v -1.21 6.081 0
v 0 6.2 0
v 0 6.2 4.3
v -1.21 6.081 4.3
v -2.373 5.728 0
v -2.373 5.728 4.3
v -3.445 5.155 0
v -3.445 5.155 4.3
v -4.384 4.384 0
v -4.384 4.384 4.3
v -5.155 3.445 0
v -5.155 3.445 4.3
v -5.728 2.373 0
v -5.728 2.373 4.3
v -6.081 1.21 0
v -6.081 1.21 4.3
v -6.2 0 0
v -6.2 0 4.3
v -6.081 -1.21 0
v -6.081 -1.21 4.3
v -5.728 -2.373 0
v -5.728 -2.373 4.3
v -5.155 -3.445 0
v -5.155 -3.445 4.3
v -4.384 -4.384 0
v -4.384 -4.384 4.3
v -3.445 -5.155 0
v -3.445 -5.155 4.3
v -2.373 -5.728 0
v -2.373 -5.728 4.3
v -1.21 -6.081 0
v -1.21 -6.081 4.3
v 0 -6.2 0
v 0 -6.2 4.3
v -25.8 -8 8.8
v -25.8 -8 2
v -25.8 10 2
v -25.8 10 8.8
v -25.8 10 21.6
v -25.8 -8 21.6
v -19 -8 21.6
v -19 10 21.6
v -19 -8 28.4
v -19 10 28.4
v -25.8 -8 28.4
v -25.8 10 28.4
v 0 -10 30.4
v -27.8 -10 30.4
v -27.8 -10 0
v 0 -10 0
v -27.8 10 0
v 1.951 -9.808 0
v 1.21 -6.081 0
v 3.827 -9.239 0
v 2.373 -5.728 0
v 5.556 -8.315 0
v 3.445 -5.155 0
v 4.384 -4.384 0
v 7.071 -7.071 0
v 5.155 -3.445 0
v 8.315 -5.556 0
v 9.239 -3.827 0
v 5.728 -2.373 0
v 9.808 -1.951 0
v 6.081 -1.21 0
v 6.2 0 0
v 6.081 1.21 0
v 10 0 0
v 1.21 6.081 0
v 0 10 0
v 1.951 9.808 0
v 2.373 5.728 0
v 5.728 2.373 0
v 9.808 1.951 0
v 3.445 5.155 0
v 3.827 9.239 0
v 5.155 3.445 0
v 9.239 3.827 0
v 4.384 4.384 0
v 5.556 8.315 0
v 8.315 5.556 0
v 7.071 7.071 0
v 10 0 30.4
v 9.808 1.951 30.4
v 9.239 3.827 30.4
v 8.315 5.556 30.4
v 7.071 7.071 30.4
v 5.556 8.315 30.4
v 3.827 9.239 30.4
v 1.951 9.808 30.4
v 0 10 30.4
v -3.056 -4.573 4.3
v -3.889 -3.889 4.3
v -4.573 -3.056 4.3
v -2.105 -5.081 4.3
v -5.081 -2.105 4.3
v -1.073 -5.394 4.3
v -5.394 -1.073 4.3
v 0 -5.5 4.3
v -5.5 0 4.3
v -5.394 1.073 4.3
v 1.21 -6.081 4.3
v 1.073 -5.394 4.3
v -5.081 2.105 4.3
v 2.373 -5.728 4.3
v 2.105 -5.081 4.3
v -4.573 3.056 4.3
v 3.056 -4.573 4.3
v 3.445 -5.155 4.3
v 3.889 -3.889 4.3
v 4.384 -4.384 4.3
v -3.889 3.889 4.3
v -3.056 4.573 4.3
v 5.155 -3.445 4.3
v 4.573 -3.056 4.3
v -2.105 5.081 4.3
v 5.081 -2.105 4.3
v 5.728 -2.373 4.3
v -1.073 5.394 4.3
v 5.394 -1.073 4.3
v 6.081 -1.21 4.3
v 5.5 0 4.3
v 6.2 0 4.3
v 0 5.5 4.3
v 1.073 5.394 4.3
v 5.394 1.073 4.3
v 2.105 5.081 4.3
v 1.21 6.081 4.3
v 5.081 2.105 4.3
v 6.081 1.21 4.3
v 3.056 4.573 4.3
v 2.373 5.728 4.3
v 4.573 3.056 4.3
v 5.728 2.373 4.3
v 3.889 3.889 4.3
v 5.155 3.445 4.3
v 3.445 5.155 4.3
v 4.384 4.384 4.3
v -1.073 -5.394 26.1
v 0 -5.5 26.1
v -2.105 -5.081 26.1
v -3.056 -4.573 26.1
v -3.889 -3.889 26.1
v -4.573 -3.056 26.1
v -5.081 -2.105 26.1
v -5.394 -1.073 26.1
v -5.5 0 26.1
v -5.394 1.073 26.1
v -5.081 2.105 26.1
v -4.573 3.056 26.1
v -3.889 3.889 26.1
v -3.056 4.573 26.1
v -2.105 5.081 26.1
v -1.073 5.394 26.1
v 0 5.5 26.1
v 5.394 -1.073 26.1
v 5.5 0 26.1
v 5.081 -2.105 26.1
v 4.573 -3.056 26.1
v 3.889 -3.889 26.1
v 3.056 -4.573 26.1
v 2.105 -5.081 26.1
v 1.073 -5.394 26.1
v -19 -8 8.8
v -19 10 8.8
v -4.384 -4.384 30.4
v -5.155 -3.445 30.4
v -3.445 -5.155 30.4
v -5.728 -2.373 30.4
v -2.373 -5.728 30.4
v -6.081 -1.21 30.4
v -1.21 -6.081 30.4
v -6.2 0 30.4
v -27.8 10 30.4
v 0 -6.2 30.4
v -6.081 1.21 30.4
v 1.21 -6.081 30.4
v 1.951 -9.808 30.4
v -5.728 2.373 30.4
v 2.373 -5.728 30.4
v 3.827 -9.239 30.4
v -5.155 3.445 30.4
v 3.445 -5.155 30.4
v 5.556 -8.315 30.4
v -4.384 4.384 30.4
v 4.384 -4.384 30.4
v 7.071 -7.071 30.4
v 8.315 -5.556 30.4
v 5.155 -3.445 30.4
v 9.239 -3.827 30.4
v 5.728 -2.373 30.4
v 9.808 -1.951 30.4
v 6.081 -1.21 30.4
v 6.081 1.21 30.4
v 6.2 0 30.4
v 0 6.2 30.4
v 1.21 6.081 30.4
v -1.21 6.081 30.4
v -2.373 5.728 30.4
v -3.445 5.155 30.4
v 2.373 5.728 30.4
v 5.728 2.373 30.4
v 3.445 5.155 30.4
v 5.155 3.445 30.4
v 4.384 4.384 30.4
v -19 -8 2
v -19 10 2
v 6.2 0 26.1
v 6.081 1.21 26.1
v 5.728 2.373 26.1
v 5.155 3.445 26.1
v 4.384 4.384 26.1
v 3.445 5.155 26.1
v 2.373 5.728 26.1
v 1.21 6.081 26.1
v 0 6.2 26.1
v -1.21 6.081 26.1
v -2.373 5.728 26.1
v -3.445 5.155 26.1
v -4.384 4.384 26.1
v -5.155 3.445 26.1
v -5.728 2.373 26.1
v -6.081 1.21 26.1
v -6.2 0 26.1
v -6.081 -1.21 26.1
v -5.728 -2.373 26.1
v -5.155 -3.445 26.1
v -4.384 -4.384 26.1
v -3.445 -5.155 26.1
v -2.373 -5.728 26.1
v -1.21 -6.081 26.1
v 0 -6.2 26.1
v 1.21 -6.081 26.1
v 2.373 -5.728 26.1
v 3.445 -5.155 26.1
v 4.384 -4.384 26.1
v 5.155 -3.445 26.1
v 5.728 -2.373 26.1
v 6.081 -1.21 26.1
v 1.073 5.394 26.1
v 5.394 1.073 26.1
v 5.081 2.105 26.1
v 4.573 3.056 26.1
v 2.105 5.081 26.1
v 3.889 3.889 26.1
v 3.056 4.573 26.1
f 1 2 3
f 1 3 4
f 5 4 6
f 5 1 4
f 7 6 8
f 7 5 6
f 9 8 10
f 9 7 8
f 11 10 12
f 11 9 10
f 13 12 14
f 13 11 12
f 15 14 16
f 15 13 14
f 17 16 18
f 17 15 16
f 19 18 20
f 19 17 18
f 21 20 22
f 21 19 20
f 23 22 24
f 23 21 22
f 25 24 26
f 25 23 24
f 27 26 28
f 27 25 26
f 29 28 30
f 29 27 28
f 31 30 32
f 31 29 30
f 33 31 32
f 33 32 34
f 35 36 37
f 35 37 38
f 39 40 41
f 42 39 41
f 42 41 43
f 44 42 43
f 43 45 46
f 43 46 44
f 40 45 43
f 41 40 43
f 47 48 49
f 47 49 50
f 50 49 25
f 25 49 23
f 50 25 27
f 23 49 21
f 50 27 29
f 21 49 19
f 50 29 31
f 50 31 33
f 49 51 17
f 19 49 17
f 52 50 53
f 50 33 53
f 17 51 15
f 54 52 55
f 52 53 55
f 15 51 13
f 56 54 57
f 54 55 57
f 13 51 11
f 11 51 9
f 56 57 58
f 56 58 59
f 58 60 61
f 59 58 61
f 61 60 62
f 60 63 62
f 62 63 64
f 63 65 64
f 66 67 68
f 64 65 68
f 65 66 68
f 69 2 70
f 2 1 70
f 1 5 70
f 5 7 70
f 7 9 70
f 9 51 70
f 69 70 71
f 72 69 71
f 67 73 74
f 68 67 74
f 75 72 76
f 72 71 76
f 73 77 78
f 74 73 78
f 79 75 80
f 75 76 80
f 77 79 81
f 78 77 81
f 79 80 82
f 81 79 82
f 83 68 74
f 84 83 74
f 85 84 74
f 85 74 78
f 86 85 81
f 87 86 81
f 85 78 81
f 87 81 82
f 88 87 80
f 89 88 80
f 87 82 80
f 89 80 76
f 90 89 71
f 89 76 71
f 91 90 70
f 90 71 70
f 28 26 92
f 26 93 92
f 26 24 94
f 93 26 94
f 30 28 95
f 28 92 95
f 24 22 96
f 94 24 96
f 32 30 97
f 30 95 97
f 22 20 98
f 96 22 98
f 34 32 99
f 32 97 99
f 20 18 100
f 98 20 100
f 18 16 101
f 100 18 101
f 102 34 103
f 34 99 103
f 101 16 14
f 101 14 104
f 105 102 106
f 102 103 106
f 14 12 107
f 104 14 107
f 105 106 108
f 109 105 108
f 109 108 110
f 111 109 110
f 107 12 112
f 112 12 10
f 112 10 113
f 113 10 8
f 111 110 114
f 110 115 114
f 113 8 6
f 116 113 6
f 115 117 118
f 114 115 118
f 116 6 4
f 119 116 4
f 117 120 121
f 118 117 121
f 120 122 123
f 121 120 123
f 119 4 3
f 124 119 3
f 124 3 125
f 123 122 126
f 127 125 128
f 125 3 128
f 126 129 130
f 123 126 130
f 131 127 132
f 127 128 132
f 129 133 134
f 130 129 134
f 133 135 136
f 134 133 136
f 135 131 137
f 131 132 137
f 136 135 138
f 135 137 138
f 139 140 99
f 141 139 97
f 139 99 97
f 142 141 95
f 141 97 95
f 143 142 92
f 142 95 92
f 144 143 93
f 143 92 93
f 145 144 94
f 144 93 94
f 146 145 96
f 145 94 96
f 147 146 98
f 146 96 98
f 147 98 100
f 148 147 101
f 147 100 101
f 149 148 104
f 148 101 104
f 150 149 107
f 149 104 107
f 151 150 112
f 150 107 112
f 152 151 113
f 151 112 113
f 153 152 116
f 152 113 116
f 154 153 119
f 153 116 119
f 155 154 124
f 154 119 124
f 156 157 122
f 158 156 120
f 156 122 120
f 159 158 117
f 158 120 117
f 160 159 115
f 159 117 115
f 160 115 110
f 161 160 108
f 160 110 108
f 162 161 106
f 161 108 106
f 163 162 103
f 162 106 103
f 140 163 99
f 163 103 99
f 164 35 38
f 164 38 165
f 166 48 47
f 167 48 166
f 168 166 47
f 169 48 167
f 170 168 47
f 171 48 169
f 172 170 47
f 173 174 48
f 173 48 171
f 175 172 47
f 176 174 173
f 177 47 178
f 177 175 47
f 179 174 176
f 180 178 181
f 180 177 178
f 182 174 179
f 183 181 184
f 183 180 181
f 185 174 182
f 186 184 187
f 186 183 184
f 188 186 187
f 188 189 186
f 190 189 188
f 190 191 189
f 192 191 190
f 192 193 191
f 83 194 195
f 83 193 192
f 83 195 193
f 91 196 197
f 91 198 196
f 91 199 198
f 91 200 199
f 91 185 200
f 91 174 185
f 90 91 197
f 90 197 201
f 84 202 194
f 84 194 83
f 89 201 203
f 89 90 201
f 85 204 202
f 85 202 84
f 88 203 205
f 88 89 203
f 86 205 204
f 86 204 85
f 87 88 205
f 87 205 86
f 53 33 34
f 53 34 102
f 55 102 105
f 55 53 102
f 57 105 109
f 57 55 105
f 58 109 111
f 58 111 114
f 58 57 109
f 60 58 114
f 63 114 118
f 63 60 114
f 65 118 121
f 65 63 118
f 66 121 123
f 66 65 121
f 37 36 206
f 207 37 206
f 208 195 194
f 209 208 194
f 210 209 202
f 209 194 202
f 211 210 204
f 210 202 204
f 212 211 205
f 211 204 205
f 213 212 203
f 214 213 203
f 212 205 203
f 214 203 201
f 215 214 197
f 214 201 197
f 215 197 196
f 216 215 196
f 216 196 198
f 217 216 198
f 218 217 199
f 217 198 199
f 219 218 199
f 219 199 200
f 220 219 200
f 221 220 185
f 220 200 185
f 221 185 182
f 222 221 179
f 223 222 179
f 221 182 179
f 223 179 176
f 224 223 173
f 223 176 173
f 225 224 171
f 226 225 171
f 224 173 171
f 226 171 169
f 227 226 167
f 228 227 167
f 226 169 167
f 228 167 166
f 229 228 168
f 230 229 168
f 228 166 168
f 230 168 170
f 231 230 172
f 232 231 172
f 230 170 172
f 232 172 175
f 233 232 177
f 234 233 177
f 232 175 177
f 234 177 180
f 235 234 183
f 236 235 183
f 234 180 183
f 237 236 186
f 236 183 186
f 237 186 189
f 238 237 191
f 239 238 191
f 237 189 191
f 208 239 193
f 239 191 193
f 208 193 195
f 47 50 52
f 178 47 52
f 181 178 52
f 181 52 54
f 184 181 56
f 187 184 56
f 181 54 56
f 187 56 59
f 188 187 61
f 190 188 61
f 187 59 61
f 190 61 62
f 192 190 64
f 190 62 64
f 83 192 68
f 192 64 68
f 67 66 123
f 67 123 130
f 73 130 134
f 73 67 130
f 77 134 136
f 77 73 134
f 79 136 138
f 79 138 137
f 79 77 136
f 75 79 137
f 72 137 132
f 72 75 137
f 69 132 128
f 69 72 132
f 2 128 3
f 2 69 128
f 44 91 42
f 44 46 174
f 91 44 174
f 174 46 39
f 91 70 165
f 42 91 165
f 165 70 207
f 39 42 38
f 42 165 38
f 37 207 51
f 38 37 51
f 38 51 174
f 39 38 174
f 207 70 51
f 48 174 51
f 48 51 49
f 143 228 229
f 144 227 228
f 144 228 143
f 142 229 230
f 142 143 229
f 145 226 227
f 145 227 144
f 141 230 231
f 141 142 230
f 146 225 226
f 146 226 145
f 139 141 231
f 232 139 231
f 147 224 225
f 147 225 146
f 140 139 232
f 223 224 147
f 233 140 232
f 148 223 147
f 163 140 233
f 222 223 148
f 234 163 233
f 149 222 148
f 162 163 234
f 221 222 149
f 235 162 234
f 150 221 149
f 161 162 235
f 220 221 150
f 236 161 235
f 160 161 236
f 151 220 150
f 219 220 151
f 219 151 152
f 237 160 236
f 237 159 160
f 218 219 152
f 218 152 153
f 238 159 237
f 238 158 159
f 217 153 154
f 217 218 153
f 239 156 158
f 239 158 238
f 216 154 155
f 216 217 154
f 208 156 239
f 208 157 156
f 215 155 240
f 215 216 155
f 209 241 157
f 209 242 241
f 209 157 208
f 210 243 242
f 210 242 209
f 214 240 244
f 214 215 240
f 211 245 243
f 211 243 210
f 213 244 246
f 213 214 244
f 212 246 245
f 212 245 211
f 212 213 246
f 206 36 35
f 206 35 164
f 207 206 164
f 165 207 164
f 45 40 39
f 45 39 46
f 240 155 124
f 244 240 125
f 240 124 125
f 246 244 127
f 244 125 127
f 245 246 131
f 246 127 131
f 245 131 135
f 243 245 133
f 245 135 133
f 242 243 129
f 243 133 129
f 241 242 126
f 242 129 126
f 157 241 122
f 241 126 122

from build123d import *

# Parameters (mm, degrees)
F1_DEPTH = 30.4
F2_W     = 6.8
F2_H     = 6.8
F3_DEPTH = 50
F4_R     = 6.2
F4_R_2   = 5.5
F5_DEPTH = 4.3
F6_DEPTH = 4.3
F7_DEPTH = 2


# Not quite as in the source:
# - a feature names something its author has since deleted; it is built from what else it names


with BuildPart() as f1:
    # F0 (on Top) → F1 (new body)
    with BuildSketch(Plane.XY):
        with BuildLine():
            ThreePointArc((0, -10), (-10, 0), (0, 10))
            Line((0, 10), (-27.8, 10))
            Line((-27.8, 10), (-27.8, -10))
            Line((-27.8, -10), (0, -10))
        make_face()
        with BuildLine():
            ThreePointArc((0, -10), (7.0710678119, -7.0710678119), (10, 0))
            ThreePointArc((10, 0), (7.0710678119, 7.0710678119), (0, 10))
            Line((0, 10), (0, 6.2))
            ThreePointArc((0, 6.2), (4.3840620434, 4.3840620434), (6.2, 0))
            ThreePointArc((6.2, 0), (4.3840620434, -4.3840620434), (0, -6.2))
            Line((0, -6.2), (0, -10))
        make_face()
        with BuildLine():
            Line((0, 6.2), (0, 10))
            ThreePointArc((0, 10), (-10, 0), (0, -10))
            Line((0, -10), (0, -6.2))
            ThreePointArc((0, -6.2), (-6.2, 0), (0, 6.2))
        make_face()
        with BuildLine():
            Line((0, 5.5), (0, 6.2))
            ThreePointArc((0, 6.2), (-6.2, 0), (0, -6.2))
            Line((0, -6.2), (0, -5.5))
            ThreePointArc((0, -5.5), (-5.5, 0), (0, 5.5))
        make_face()
        with BuildLine():
            ThreePointArc((6.2, 0), (4.3840620434, 4.3840620434), (0, 6.2))
            Line((0, 6.2), (0, 5.5))
            ThreePointArc((0, 5.5), (3.8890872965, 3.8890872965), (5.5, 0))
            ThreePointArc((5.5, 0), (3.8890872965, -3.8890872965), (0, -5.5))
            Line((0, -5.5), (0, -6.2))
            ThreePointArc((0, -6.2), (4.3840620434, -4.3840620434), (6.2, 0))
        make_face()
    extrude(amount=F1_DEPTH)

    # F2 (on face) → F3 (cut)
    with BuildSketch(Plane.XZ.offset(10)):
        with Locations((-22.4, 25)):
            Rectangle(F2_W, F2_H)
        with Locations((-22.4, 5.4)):
            Rectangle(F2_W, F2_H)
    extrude(amount=-F3_DEPTH, mode=Mode.SUBTRACT)

    # F4 (on face) → F5 (cut)
    with BuildSketch(Plane.XY.offset(30.4)):
        Circle(F4_R)
        Circle(F4_R_2, mode=Mode.SUBTRACT)
    extrude(amount=-F5_DEPTH, mode=Mode.SUBTRACT)

    # F0 (on Top) → F6 (cut)
    with BuildSketch(Plane.XY):
        with BuildLine():
            ThreePointArc((6.2, 0), (4.3840620434, 4.3840620434), (0, 6.2))
            Line((0, 6.2), (0, 5.5))
            ThreePointArc((0, 5.5), (3.8890872965, 3.8890872965), (5.5, 0))
            ThreePointArc((5.5, 0), (3.8890872965, -3.8890872965), (0, -5.5))
            Line((0, -5.5), (0, -6.2))
            ThreePointArc((0, -6.2), (4.3840620434, -4.3840620434), (6.2, 0))
        make_face()
        with BuildLine():
            Line((0, 5.5), (0, 6.2))
            ThreePointArc((0, 6.2), (-6.2, 0), (0, -6.2))
            Line((0, -6.2), (0, -5.5))
            ThreePointArc((0, -5.5), (-5.5, 0), (0, 5.5))
        make_face()
    extrude(amount=F6_DEPTH, mode=Mode.SUBTRACT)

    # F2 (on face) → F7 (join)
    with BuildSketch(Plane.XZ.offset(10)):
        with Locations((-22.4, 25)):
            Rectangle(F2_W, F2_H)
        with Locations((-22.4, 5.4)):
            Rectangle(F2_W, F2_H)
    extrude(amount=-F7_DEPTH)


solid = f1.part
